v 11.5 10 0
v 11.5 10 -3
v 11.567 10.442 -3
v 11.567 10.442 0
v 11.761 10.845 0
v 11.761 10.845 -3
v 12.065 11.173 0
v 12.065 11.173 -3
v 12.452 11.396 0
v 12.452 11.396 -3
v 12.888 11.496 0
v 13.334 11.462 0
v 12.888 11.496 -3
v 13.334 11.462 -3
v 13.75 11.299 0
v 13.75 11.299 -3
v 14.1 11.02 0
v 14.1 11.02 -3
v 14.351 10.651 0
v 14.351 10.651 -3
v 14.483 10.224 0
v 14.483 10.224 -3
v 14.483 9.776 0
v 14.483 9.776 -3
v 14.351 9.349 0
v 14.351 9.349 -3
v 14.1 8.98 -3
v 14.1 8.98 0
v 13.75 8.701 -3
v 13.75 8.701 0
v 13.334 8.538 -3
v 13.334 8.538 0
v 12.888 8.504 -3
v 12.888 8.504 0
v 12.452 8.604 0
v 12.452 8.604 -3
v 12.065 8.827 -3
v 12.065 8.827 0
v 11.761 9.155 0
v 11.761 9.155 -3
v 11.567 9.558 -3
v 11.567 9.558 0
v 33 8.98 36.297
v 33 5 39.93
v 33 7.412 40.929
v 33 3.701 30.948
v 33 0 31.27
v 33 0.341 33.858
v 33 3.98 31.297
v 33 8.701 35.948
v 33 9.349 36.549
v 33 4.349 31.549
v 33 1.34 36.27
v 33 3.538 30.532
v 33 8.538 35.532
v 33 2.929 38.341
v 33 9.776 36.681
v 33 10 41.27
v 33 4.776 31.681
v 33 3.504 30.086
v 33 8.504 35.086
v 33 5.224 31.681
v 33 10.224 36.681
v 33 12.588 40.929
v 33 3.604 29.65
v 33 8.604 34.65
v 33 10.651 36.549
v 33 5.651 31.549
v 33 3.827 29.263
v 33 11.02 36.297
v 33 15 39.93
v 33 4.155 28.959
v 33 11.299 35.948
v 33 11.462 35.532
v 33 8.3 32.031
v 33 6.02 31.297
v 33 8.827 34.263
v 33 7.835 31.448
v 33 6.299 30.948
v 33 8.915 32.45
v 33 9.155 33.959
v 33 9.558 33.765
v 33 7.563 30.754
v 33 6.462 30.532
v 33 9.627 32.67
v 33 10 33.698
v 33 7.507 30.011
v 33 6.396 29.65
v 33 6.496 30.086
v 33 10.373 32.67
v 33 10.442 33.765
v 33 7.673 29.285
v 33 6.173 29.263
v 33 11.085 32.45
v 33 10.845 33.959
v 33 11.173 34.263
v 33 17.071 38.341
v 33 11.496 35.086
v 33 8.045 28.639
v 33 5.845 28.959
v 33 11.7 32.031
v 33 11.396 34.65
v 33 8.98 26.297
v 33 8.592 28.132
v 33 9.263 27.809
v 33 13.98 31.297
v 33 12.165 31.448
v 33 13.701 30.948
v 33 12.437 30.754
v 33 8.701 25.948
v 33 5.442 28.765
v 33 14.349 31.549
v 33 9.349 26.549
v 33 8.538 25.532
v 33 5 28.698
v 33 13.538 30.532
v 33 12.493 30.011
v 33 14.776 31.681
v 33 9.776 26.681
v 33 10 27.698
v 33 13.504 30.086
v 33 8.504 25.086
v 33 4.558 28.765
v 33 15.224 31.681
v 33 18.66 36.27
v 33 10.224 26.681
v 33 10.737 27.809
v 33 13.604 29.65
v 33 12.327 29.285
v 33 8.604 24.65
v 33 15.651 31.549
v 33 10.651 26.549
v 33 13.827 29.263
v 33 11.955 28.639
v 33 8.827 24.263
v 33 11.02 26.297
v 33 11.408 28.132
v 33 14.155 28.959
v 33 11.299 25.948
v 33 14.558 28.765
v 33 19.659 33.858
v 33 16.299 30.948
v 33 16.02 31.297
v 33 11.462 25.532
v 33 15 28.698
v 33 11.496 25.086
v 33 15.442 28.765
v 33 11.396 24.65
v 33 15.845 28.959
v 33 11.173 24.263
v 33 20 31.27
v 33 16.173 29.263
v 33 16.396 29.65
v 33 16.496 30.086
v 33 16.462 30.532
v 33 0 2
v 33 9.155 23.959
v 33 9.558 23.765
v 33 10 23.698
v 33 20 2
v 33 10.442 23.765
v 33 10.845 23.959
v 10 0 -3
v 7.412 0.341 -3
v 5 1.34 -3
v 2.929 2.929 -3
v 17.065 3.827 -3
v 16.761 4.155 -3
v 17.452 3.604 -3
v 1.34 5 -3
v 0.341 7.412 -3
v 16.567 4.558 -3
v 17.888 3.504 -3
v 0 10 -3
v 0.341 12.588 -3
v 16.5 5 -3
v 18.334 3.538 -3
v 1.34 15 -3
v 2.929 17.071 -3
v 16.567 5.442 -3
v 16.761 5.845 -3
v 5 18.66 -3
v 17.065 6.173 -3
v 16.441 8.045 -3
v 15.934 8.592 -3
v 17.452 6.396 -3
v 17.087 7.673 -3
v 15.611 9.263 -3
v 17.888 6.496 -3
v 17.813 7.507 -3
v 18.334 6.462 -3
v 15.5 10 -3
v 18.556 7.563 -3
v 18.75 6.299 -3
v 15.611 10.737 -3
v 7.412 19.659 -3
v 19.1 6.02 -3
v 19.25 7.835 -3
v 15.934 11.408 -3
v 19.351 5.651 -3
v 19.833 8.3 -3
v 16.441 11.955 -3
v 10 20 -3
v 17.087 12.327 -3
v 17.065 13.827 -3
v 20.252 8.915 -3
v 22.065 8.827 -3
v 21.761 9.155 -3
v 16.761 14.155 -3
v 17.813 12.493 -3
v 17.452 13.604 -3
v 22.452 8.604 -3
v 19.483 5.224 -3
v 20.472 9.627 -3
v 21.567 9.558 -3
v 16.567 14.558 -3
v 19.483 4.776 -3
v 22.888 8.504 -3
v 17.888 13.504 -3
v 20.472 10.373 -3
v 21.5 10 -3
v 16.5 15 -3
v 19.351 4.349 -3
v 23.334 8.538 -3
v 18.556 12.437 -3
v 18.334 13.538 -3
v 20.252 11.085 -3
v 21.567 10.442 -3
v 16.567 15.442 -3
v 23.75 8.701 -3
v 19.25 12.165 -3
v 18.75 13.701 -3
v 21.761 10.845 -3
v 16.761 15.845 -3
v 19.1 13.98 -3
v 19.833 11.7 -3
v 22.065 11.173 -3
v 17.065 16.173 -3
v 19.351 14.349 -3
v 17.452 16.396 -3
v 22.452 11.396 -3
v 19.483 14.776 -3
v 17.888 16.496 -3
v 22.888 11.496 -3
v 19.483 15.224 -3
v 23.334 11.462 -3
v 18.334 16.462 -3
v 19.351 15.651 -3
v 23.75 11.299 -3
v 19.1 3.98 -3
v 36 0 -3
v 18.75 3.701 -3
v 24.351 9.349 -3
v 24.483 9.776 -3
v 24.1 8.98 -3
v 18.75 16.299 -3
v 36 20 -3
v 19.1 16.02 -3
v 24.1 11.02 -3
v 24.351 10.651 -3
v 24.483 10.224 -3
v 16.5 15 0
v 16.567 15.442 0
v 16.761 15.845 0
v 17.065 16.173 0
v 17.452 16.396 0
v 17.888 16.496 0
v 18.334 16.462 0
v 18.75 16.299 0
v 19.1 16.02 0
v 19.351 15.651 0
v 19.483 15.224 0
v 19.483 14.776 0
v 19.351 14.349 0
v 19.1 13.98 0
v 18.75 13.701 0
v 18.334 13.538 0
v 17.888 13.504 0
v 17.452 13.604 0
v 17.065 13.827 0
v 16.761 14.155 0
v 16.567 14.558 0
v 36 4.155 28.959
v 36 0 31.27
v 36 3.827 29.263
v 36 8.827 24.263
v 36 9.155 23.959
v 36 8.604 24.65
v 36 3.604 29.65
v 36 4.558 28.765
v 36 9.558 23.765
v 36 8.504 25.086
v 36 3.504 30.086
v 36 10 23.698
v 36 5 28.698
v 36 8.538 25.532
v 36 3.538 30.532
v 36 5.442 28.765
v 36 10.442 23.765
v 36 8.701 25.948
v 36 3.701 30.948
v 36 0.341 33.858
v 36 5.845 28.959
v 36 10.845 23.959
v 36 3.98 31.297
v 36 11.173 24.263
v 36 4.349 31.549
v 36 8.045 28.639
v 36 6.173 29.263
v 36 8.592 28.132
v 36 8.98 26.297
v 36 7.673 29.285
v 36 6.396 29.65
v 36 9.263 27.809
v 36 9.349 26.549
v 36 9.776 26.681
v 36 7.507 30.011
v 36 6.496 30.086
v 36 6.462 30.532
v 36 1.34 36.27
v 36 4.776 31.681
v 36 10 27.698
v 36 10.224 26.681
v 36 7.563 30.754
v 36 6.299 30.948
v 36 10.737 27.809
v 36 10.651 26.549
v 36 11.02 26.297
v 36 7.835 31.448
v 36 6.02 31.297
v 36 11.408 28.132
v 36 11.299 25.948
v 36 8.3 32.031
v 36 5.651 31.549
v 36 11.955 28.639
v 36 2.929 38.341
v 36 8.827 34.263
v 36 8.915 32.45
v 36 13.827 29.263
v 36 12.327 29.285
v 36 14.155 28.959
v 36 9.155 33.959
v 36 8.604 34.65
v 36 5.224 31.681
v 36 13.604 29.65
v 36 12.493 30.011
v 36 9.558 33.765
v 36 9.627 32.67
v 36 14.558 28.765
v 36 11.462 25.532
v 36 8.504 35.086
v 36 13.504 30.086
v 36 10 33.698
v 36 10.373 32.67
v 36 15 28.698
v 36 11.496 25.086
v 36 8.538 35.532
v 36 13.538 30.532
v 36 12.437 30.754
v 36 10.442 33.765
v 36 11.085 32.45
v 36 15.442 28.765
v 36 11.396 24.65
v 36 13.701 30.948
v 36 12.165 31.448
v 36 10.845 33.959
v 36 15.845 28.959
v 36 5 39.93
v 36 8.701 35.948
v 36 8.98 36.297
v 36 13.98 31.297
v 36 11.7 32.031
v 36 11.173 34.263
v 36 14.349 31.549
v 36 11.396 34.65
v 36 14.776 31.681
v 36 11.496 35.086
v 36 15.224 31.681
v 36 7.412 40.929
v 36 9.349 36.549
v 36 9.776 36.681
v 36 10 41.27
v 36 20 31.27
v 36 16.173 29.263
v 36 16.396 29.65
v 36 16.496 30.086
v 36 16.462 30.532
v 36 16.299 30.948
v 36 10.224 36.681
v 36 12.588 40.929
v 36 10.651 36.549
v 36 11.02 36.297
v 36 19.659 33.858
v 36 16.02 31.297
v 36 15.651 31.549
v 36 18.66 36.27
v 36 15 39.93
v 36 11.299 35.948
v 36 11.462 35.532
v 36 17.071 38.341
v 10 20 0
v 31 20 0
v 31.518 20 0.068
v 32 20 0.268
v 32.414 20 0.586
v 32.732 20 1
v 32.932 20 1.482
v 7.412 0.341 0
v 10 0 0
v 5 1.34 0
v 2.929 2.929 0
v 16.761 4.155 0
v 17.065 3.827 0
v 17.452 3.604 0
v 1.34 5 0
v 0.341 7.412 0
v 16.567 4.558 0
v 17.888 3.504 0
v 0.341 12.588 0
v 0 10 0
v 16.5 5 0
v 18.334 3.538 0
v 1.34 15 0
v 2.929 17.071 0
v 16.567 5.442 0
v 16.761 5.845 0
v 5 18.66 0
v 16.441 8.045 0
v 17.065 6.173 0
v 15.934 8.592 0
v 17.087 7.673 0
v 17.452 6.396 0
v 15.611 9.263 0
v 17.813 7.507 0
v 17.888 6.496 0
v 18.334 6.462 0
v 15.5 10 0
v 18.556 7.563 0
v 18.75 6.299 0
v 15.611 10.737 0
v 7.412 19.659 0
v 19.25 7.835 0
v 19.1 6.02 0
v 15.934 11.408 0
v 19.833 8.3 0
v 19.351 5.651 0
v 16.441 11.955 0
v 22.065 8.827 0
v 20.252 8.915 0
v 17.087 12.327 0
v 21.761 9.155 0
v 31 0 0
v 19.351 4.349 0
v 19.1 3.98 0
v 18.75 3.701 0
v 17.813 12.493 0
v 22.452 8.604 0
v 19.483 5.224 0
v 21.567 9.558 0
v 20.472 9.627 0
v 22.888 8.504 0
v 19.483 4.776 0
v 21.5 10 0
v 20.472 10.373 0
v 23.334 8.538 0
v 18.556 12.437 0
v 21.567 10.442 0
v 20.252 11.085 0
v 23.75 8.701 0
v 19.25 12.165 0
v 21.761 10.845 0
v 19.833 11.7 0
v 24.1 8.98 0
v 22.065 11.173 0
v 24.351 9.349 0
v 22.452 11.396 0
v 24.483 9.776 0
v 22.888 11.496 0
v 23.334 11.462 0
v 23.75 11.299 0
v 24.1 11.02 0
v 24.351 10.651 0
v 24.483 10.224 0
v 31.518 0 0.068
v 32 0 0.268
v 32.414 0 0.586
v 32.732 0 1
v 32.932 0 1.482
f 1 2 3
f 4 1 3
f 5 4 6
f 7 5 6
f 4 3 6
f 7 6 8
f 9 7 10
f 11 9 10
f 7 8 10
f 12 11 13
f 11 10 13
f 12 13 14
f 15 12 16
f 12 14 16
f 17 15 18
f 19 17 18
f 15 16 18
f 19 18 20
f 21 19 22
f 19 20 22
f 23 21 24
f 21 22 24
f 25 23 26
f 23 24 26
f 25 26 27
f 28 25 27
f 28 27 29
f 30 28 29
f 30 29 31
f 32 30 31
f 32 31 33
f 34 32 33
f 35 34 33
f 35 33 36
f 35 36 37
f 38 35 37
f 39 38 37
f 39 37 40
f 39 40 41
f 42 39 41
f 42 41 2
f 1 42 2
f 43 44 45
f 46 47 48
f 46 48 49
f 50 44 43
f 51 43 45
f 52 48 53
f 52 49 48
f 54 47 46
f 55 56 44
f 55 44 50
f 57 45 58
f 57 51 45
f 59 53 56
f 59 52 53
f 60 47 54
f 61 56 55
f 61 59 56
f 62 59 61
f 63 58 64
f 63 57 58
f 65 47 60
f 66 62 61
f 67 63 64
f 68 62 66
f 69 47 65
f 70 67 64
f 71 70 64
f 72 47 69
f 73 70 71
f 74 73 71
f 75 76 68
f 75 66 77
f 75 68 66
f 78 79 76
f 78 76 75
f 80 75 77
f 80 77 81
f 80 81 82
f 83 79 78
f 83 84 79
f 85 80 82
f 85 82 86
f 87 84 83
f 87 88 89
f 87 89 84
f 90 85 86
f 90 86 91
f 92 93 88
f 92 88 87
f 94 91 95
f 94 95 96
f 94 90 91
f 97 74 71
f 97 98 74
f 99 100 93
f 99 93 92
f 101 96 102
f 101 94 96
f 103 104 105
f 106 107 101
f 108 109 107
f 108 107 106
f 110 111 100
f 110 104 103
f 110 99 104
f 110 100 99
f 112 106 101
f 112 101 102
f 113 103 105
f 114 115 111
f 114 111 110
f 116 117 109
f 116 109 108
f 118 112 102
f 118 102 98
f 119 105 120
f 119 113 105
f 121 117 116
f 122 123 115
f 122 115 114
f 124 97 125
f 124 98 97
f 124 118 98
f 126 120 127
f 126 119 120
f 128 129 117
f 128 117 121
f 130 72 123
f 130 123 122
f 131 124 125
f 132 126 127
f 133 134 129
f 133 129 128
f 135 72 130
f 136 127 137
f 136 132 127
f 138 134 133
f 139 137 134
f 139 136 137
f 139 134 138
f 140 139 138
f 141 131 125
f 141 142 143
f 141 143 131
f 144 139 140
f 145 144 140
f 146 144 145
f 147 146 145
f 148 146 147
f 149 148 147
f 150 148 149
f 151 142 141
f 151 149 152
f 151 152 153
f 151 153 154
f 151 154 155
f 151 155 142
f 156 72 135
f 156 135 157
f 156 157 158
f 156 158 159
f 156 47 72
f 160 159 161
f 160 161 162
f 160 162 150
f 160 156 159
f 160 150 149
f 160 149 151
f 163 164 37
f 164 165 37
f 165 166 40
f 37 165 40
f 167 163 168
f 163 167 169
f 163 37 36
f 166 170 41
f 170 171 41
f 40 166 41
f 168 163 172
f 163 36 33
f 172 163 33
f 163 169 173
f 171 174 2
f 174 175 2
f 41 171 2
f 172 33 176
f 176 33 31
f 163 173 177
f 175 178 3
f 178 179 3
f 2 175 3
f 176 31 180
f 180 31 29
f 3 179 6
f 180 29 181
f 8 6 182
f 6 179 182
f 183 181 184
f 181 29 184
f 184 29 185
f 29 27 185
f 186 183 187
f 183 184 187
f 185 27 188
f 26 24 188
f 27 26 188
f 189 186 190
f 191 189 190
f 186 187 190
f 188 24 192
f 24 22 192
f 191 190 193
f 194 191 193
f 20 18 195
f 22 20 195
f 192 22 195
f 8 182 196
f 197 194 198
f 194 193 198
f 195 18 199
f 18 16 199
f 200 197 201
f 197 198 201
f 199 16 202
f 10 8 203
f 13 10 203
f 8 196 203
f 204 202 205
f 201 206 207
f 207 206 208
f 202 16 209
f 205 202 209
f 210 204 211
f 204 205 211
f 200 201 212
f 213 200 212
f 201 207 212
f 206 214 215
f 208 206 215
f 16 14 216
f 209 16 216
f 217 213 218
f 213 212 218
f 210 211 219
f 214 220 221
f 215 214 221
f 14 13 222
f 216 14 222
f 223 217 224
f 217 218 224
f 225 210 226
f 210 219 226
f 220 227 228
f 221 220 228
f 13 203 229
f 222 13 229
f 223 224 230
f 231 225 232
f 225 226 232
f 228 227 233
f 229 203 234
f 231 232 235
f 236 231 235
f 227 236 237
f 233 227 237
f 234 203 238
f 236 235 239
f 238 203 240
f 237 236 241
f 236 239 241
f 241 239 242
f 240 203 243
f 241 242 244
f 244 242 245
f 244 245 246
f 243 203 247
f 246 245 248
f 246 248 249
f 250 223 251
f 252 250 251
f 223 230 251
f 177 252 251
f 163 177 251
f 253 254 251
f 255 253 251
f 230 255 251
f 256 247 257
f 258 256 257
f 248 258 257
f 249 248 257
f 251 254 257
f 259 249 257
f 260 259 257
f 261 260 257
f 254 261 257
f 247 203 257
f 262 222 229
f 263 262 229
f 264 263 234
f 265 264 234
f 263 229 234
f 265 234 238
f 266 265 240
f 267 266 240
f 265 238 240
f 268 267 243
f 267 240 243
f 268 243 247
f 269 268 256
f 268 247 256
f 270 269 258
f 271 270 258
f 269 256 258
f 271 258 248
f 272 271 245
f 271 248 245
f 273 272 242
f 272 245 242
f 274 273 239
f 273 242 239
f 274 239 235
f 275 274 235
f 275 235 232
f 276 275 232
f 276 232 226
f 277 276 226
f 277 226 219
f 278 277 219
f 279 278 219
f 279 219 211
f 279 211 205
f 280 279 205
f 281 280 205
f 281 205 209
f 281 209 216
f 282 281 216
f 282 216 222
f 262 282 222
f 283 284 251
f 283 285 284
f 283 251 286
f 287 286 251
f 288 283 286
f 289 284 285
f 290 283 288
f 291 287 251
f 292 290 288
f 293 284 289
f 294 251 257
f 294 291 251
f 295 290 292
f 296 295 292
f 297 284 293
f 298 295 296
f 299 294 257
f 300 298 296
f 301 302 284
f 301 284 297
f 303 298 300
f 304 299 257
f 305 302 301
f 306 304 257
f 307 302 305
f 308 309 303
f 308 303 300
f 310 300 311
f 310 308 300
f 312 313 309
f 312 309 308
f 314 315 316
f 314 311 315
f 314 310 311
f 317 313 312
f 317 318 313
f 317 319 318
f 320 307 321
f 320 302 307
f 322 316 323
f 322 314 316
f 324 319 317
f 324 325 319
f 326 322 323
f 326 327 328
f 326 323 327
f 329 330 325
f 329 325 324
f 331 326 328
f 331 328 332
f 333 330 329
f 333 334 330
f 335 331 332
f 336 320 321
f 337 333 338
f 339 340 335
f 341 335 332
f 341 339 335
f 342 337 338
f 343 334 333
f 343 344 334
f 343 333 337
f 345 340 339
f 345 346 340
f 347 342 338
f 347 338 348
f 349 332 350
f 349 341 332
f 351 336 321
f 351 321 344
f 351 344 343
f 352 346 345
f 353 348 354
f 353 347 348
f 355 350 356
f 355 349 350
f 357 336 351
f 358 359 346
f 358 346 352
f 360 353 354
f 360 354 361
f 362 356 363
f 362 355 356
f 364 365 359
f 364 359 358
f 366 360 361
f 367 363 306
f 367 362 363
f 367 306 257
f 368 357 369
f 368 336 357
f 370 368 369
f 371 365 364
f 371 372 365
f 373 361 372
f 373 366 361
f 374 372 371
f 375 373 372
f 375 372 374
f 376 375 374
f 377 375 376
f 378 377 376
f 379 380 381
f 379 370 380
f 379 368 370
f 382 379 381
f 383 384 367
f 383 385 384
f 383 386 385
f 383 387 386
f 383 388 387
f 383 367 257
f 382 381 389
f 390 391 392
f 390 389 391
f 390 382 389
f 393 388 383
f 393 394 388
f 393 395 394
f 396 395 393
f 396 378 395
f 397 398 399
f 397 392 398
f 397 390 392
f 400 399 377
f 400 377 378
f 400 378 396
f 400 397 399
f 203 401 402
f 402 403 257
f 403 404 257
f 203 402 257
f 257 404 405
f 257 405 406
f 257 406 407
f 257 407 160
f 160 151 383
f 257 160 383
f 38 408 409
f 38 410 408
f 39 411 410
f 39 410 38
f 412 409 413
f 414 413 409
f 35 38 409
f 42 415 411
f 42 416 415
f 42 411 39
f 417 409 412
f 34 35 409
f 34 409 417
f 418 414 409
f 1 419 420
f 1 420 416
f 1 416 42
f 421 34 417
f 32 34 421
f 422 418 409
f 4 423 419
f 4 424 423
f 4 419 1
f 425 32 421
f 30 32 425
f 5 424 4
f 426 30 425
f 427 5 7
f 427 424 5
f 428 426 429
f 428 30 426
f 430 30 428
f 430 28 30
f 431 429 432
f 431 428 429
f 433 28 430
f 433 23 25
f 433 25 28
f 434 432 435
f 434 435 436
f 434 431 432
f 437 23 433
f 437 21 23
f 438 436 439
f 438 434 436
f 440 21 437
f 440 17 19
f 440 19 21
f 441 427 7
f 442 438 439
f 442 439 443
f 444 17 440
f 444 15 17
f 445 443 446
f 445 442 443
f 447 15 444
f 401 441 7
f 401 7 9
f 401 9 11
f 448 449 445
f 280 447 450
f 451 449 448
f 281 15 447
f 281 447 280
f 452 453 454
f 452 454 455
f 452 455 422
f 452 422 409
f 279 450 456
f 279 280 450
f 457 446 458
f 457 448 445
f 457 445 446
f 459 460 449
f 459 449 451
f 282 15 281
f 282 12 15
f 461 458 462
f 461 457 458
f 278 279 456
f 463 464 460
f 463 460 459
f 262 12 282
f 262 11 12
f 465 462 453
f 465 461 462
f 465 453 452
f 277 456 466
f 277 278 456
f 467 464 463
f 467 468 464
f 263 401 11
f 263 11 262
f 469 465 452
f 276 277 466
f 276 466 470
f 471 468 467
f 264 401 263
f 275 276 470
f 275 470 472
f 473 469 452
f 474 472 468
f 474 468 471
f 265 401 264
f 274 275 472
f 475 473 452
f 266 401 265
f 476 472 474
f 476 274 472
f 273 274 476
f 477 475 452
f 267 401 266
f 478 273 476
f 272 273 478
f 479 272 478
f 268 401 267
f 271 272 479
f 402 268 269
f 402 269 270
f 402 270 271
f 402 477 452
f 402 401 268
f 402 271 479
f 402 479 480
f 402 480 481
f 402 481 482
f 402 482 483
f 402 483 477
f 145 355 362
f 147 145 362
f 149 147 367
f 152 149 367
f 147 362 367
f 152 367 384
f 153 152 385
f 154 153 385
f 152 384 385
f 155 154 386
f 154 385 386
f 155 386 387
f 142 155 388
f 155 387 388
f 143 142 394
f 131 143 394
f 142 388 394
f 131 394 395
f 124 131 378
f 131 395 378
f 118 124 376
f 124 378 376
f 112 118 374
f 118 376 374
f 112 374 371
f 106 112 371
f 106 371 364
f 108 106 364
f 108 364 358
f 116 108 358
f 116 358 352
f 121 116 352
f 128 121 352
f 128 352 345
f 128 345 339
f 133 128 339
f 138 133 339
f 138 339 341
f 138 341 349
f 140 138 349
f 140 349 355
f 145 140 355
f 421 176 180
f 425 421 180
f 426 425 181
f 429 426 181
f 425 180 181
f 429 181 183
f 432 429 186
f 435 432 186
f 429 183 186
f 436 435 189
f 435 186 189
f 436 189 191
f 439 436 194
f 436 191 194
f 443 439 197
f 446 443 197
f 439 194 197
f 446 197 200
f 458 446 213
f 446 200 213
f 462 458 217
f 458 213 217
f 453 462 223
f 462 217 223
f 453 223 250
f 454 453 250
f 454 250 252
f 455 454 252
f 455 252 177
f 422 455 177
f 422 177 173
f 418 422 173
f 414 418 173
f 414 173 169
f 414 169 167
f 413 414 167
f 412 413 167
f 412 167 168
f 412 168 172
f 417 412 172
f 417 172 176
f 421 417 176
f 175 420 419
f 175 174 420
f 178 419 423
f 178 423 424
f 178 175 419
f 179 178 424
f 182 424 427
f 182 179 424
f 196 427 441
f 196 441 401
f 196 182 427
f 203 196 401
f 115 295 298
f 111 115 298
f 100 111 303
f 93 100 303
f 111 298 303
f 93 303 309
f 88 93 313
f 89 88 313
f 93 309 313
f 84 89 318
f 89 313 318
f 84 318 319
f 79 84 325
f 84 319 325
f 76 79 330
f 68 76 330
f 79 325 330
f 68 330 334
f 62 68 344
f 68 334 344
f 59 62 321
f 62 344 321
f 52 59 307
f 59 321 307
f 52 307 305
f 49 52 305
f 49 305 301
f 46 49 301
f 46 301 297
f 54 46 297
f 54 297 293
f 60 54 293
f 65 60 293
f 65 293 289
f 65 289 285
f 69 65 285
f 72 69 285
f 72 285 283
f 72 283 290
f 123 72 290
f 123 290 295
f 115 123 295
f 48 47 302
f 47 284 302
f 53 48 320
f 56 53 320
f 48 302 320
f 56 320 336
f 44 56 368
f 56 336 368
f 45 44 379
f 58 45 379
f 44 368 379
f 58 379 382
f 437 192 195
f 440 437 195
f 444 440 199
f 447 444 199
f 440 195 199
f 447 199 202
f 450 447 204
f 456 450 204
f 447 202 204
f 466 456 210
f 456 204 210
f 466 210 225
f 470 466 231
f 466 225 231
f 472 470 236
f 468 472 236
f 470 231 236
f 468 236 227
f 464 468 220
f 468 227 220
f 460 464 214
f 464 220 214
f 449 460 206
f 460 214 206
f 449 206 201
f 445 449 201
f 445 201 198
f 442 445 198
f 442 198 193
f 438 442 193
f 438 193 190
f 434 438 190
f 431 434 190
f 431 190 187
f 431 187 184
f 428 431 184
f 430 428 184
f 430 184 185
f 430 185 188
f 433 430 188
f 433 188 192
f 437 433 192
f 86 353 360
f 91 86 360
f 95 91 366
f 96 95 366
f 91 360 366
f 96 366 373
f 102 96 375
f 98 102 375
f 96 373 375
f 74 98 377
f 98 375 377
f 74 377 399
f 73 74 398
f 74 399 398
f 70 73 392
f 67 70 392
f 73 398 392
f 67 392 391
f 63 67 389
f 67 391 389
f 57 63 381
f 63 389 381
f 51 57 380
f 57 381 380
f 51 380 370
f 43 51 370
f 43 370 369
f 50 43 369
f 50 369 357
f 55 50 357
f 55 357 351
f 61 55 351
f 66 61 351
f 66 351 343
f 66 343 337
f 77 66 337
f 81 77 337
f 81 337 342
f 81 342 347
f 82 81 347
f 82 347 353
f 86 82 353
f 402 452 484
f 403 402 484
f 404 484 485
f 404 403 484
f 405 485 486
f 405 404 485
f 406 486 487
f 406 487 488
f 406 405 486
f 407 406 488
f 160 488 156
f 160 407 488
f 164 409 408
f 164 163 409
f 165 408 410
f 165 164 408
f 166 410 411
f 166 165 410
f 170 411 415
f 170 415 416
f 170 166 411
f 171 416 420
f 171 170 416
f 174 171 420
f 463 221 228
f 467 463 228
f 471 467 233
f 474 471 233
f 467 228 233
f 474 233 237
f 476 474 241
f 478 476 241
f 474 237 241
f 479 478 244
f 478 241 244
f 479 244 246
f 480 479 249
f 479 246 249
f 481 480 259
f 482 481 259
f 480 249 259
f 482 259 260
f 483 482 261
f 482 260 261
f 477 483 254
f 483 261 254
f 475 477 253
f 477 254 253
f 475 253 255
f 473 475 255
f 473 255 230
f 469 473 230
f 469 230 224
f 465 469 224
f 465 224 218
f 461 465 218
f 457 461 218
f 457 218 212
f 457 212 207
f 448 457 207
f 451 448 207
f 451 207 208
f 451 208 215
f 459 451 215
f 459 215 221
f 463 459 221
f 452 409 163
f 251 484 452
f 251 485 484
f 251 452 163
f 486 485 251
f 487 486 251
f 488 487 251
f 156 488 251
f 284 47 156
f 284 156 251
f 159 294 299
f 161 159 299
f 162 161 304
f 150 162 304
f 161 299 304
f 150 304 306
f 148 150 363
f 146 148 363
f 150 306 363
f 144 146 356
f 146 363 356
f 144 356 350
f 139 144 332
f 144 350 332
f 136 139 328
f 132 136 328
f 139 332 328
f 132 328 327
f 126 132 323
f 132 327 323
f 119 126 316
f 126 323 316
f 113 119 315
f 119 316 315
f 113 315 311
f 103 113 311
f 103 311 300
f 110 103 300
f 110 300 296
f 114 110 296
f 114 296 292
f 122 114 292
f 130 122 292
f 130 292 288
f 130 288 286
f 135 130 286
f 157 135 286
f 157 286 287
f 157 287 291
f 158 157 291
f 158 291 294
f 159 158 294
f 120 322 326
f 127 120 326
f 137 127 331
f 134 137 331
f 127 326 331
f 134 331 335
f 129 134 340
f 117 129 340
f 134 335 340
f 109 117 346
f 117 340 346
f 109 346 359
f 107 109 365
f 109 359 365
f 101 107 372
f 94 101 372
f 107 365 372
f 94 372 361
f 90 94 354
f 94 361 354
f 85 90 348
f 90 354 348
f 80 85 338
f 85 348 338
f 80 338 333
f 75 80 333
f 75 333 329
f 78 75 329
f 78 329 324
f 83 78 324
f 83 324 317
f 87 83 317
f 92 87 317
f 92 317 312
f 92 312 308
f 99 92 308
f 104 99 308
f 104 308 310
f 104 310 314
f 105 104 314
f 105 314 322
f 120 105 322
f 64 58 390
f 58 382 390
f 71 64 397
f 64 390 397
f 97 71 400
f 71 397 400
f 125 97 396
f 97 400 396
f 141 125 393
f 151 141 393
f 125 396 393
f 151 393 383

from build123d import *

# Parameters (mm, degrees)
ESQUISSE1_W             = 3
ESQUISSE1_H             = 20
BOSS_EXTRU_1_DEPTH      = 41.27
ESQUISSE1_3_W           = 36
ESQUISSE1_3_H           = 20
BOSS_EXTRU_2_DEPTH      = 3
ESQUISSE3_R             = 1.5
ESQUISSE3_R_2           = 2.5
ENL_V_MAT_EXTRU_2_DEPTH = 85
CONG_2_R                = 2
CONG_3_R                = 10
ESQUISSE7_R             = 1.5
ESQUISSE7_R_2           = 2.5
ENL_V_MAT_EXTRU_3_DEPTH = 10


with BuildPart() as part:
    # Esquisse1 → Boss.-Extru.1 (new body)
    with BuildSketch(Plane.XY):
        with Locations((34.5, 10)):
            Rectangle(ESQUISSE1_W, ESQUISSE1_H)
    extrude(amount=BOSS_EXTRU_1_DEPTH)

    # Esquisse1<3> → Boss.-Extru.2 (add)
    with BuildSketch(Plane.XY):
        with Locations((18, 10)):
            Rectangle(ESQUISSE1_3_W, ESQUISSE1_3_H)
    extrude(amount=-BOSS_EXTRU_2_DEPTH)

    # Esquisse3 → Enlèv. mat.-Extru.2 (cut)
    with BuildSketch(Plane(origin=(36, 0, 0), x_dir=(0, 0, -1), z_dir=(1, 0, 0))):
        with Locations((-30.197874881, 15)):
            Circle(ESQUISSE3_R)
        with Locations((-30.197874881, 5)):
            Circle(ESQUISSE3_R)
        with Locations((-35.197874881, 10)):
            Circle(ESQUISSE3_R)
        with Locations((-25.197874881, 10)):
            Circle(ESQUISSE3_R)
        with Locations((-30.197874881, 10)):
            Circle(ESQUISSE3_R_2)
    extrude(amount=-ENL_V_MAT_EXTRU_2_DEPTH, mode=Mode.SUBTRACT)

    # Congé2
    cong_2_edges = [part.edges().sort_by_distance(p)[0] for p in [
        (33, 10, 0),
    ]]
    fillet(cong_2_edges, radius=CONG_2_R)

    # Congé3
    cong_3_edges = [part.edges().sort_by_distance(p)[0] for p in [
        (0, 20, -1.5),
        (0, 0, -1.5),
        (34.5, 20, 41.27),
        (34.5, 0, 41.27),
    ]]
    fillet(cong_3_edges, radius=CONG_3_R - 0.0001)  # a hair under: the kernel refuses the full size

    # Esquisse7 → Enlèv. mat.-Extru.3 (cut)
    with BuildSketch(Plane(origin=(0, 0, -3), x_dir=(-1, 0, 0), z_dir=(0, 0, -1))):
        with Locations((-23, 10)):
            Circle(ESQUISSE7_R)
        with Locations((-18, 15)):
            Circle(ESQUISSE7_R)
        with Locations((-13, 10)):
            Circle(ESQUISSE7_R)
        with Locations((-18, 5)):
            Circle(ESQUISSE7_R)
        with Locations((-18, 10)):
            Circle(ESQUISSE7_R_2)
    extrude(amount=-ENL_V_MAT_EXTRU_3_DEPTH, mode=Mode.SUBTRACT)


solid = part.part
